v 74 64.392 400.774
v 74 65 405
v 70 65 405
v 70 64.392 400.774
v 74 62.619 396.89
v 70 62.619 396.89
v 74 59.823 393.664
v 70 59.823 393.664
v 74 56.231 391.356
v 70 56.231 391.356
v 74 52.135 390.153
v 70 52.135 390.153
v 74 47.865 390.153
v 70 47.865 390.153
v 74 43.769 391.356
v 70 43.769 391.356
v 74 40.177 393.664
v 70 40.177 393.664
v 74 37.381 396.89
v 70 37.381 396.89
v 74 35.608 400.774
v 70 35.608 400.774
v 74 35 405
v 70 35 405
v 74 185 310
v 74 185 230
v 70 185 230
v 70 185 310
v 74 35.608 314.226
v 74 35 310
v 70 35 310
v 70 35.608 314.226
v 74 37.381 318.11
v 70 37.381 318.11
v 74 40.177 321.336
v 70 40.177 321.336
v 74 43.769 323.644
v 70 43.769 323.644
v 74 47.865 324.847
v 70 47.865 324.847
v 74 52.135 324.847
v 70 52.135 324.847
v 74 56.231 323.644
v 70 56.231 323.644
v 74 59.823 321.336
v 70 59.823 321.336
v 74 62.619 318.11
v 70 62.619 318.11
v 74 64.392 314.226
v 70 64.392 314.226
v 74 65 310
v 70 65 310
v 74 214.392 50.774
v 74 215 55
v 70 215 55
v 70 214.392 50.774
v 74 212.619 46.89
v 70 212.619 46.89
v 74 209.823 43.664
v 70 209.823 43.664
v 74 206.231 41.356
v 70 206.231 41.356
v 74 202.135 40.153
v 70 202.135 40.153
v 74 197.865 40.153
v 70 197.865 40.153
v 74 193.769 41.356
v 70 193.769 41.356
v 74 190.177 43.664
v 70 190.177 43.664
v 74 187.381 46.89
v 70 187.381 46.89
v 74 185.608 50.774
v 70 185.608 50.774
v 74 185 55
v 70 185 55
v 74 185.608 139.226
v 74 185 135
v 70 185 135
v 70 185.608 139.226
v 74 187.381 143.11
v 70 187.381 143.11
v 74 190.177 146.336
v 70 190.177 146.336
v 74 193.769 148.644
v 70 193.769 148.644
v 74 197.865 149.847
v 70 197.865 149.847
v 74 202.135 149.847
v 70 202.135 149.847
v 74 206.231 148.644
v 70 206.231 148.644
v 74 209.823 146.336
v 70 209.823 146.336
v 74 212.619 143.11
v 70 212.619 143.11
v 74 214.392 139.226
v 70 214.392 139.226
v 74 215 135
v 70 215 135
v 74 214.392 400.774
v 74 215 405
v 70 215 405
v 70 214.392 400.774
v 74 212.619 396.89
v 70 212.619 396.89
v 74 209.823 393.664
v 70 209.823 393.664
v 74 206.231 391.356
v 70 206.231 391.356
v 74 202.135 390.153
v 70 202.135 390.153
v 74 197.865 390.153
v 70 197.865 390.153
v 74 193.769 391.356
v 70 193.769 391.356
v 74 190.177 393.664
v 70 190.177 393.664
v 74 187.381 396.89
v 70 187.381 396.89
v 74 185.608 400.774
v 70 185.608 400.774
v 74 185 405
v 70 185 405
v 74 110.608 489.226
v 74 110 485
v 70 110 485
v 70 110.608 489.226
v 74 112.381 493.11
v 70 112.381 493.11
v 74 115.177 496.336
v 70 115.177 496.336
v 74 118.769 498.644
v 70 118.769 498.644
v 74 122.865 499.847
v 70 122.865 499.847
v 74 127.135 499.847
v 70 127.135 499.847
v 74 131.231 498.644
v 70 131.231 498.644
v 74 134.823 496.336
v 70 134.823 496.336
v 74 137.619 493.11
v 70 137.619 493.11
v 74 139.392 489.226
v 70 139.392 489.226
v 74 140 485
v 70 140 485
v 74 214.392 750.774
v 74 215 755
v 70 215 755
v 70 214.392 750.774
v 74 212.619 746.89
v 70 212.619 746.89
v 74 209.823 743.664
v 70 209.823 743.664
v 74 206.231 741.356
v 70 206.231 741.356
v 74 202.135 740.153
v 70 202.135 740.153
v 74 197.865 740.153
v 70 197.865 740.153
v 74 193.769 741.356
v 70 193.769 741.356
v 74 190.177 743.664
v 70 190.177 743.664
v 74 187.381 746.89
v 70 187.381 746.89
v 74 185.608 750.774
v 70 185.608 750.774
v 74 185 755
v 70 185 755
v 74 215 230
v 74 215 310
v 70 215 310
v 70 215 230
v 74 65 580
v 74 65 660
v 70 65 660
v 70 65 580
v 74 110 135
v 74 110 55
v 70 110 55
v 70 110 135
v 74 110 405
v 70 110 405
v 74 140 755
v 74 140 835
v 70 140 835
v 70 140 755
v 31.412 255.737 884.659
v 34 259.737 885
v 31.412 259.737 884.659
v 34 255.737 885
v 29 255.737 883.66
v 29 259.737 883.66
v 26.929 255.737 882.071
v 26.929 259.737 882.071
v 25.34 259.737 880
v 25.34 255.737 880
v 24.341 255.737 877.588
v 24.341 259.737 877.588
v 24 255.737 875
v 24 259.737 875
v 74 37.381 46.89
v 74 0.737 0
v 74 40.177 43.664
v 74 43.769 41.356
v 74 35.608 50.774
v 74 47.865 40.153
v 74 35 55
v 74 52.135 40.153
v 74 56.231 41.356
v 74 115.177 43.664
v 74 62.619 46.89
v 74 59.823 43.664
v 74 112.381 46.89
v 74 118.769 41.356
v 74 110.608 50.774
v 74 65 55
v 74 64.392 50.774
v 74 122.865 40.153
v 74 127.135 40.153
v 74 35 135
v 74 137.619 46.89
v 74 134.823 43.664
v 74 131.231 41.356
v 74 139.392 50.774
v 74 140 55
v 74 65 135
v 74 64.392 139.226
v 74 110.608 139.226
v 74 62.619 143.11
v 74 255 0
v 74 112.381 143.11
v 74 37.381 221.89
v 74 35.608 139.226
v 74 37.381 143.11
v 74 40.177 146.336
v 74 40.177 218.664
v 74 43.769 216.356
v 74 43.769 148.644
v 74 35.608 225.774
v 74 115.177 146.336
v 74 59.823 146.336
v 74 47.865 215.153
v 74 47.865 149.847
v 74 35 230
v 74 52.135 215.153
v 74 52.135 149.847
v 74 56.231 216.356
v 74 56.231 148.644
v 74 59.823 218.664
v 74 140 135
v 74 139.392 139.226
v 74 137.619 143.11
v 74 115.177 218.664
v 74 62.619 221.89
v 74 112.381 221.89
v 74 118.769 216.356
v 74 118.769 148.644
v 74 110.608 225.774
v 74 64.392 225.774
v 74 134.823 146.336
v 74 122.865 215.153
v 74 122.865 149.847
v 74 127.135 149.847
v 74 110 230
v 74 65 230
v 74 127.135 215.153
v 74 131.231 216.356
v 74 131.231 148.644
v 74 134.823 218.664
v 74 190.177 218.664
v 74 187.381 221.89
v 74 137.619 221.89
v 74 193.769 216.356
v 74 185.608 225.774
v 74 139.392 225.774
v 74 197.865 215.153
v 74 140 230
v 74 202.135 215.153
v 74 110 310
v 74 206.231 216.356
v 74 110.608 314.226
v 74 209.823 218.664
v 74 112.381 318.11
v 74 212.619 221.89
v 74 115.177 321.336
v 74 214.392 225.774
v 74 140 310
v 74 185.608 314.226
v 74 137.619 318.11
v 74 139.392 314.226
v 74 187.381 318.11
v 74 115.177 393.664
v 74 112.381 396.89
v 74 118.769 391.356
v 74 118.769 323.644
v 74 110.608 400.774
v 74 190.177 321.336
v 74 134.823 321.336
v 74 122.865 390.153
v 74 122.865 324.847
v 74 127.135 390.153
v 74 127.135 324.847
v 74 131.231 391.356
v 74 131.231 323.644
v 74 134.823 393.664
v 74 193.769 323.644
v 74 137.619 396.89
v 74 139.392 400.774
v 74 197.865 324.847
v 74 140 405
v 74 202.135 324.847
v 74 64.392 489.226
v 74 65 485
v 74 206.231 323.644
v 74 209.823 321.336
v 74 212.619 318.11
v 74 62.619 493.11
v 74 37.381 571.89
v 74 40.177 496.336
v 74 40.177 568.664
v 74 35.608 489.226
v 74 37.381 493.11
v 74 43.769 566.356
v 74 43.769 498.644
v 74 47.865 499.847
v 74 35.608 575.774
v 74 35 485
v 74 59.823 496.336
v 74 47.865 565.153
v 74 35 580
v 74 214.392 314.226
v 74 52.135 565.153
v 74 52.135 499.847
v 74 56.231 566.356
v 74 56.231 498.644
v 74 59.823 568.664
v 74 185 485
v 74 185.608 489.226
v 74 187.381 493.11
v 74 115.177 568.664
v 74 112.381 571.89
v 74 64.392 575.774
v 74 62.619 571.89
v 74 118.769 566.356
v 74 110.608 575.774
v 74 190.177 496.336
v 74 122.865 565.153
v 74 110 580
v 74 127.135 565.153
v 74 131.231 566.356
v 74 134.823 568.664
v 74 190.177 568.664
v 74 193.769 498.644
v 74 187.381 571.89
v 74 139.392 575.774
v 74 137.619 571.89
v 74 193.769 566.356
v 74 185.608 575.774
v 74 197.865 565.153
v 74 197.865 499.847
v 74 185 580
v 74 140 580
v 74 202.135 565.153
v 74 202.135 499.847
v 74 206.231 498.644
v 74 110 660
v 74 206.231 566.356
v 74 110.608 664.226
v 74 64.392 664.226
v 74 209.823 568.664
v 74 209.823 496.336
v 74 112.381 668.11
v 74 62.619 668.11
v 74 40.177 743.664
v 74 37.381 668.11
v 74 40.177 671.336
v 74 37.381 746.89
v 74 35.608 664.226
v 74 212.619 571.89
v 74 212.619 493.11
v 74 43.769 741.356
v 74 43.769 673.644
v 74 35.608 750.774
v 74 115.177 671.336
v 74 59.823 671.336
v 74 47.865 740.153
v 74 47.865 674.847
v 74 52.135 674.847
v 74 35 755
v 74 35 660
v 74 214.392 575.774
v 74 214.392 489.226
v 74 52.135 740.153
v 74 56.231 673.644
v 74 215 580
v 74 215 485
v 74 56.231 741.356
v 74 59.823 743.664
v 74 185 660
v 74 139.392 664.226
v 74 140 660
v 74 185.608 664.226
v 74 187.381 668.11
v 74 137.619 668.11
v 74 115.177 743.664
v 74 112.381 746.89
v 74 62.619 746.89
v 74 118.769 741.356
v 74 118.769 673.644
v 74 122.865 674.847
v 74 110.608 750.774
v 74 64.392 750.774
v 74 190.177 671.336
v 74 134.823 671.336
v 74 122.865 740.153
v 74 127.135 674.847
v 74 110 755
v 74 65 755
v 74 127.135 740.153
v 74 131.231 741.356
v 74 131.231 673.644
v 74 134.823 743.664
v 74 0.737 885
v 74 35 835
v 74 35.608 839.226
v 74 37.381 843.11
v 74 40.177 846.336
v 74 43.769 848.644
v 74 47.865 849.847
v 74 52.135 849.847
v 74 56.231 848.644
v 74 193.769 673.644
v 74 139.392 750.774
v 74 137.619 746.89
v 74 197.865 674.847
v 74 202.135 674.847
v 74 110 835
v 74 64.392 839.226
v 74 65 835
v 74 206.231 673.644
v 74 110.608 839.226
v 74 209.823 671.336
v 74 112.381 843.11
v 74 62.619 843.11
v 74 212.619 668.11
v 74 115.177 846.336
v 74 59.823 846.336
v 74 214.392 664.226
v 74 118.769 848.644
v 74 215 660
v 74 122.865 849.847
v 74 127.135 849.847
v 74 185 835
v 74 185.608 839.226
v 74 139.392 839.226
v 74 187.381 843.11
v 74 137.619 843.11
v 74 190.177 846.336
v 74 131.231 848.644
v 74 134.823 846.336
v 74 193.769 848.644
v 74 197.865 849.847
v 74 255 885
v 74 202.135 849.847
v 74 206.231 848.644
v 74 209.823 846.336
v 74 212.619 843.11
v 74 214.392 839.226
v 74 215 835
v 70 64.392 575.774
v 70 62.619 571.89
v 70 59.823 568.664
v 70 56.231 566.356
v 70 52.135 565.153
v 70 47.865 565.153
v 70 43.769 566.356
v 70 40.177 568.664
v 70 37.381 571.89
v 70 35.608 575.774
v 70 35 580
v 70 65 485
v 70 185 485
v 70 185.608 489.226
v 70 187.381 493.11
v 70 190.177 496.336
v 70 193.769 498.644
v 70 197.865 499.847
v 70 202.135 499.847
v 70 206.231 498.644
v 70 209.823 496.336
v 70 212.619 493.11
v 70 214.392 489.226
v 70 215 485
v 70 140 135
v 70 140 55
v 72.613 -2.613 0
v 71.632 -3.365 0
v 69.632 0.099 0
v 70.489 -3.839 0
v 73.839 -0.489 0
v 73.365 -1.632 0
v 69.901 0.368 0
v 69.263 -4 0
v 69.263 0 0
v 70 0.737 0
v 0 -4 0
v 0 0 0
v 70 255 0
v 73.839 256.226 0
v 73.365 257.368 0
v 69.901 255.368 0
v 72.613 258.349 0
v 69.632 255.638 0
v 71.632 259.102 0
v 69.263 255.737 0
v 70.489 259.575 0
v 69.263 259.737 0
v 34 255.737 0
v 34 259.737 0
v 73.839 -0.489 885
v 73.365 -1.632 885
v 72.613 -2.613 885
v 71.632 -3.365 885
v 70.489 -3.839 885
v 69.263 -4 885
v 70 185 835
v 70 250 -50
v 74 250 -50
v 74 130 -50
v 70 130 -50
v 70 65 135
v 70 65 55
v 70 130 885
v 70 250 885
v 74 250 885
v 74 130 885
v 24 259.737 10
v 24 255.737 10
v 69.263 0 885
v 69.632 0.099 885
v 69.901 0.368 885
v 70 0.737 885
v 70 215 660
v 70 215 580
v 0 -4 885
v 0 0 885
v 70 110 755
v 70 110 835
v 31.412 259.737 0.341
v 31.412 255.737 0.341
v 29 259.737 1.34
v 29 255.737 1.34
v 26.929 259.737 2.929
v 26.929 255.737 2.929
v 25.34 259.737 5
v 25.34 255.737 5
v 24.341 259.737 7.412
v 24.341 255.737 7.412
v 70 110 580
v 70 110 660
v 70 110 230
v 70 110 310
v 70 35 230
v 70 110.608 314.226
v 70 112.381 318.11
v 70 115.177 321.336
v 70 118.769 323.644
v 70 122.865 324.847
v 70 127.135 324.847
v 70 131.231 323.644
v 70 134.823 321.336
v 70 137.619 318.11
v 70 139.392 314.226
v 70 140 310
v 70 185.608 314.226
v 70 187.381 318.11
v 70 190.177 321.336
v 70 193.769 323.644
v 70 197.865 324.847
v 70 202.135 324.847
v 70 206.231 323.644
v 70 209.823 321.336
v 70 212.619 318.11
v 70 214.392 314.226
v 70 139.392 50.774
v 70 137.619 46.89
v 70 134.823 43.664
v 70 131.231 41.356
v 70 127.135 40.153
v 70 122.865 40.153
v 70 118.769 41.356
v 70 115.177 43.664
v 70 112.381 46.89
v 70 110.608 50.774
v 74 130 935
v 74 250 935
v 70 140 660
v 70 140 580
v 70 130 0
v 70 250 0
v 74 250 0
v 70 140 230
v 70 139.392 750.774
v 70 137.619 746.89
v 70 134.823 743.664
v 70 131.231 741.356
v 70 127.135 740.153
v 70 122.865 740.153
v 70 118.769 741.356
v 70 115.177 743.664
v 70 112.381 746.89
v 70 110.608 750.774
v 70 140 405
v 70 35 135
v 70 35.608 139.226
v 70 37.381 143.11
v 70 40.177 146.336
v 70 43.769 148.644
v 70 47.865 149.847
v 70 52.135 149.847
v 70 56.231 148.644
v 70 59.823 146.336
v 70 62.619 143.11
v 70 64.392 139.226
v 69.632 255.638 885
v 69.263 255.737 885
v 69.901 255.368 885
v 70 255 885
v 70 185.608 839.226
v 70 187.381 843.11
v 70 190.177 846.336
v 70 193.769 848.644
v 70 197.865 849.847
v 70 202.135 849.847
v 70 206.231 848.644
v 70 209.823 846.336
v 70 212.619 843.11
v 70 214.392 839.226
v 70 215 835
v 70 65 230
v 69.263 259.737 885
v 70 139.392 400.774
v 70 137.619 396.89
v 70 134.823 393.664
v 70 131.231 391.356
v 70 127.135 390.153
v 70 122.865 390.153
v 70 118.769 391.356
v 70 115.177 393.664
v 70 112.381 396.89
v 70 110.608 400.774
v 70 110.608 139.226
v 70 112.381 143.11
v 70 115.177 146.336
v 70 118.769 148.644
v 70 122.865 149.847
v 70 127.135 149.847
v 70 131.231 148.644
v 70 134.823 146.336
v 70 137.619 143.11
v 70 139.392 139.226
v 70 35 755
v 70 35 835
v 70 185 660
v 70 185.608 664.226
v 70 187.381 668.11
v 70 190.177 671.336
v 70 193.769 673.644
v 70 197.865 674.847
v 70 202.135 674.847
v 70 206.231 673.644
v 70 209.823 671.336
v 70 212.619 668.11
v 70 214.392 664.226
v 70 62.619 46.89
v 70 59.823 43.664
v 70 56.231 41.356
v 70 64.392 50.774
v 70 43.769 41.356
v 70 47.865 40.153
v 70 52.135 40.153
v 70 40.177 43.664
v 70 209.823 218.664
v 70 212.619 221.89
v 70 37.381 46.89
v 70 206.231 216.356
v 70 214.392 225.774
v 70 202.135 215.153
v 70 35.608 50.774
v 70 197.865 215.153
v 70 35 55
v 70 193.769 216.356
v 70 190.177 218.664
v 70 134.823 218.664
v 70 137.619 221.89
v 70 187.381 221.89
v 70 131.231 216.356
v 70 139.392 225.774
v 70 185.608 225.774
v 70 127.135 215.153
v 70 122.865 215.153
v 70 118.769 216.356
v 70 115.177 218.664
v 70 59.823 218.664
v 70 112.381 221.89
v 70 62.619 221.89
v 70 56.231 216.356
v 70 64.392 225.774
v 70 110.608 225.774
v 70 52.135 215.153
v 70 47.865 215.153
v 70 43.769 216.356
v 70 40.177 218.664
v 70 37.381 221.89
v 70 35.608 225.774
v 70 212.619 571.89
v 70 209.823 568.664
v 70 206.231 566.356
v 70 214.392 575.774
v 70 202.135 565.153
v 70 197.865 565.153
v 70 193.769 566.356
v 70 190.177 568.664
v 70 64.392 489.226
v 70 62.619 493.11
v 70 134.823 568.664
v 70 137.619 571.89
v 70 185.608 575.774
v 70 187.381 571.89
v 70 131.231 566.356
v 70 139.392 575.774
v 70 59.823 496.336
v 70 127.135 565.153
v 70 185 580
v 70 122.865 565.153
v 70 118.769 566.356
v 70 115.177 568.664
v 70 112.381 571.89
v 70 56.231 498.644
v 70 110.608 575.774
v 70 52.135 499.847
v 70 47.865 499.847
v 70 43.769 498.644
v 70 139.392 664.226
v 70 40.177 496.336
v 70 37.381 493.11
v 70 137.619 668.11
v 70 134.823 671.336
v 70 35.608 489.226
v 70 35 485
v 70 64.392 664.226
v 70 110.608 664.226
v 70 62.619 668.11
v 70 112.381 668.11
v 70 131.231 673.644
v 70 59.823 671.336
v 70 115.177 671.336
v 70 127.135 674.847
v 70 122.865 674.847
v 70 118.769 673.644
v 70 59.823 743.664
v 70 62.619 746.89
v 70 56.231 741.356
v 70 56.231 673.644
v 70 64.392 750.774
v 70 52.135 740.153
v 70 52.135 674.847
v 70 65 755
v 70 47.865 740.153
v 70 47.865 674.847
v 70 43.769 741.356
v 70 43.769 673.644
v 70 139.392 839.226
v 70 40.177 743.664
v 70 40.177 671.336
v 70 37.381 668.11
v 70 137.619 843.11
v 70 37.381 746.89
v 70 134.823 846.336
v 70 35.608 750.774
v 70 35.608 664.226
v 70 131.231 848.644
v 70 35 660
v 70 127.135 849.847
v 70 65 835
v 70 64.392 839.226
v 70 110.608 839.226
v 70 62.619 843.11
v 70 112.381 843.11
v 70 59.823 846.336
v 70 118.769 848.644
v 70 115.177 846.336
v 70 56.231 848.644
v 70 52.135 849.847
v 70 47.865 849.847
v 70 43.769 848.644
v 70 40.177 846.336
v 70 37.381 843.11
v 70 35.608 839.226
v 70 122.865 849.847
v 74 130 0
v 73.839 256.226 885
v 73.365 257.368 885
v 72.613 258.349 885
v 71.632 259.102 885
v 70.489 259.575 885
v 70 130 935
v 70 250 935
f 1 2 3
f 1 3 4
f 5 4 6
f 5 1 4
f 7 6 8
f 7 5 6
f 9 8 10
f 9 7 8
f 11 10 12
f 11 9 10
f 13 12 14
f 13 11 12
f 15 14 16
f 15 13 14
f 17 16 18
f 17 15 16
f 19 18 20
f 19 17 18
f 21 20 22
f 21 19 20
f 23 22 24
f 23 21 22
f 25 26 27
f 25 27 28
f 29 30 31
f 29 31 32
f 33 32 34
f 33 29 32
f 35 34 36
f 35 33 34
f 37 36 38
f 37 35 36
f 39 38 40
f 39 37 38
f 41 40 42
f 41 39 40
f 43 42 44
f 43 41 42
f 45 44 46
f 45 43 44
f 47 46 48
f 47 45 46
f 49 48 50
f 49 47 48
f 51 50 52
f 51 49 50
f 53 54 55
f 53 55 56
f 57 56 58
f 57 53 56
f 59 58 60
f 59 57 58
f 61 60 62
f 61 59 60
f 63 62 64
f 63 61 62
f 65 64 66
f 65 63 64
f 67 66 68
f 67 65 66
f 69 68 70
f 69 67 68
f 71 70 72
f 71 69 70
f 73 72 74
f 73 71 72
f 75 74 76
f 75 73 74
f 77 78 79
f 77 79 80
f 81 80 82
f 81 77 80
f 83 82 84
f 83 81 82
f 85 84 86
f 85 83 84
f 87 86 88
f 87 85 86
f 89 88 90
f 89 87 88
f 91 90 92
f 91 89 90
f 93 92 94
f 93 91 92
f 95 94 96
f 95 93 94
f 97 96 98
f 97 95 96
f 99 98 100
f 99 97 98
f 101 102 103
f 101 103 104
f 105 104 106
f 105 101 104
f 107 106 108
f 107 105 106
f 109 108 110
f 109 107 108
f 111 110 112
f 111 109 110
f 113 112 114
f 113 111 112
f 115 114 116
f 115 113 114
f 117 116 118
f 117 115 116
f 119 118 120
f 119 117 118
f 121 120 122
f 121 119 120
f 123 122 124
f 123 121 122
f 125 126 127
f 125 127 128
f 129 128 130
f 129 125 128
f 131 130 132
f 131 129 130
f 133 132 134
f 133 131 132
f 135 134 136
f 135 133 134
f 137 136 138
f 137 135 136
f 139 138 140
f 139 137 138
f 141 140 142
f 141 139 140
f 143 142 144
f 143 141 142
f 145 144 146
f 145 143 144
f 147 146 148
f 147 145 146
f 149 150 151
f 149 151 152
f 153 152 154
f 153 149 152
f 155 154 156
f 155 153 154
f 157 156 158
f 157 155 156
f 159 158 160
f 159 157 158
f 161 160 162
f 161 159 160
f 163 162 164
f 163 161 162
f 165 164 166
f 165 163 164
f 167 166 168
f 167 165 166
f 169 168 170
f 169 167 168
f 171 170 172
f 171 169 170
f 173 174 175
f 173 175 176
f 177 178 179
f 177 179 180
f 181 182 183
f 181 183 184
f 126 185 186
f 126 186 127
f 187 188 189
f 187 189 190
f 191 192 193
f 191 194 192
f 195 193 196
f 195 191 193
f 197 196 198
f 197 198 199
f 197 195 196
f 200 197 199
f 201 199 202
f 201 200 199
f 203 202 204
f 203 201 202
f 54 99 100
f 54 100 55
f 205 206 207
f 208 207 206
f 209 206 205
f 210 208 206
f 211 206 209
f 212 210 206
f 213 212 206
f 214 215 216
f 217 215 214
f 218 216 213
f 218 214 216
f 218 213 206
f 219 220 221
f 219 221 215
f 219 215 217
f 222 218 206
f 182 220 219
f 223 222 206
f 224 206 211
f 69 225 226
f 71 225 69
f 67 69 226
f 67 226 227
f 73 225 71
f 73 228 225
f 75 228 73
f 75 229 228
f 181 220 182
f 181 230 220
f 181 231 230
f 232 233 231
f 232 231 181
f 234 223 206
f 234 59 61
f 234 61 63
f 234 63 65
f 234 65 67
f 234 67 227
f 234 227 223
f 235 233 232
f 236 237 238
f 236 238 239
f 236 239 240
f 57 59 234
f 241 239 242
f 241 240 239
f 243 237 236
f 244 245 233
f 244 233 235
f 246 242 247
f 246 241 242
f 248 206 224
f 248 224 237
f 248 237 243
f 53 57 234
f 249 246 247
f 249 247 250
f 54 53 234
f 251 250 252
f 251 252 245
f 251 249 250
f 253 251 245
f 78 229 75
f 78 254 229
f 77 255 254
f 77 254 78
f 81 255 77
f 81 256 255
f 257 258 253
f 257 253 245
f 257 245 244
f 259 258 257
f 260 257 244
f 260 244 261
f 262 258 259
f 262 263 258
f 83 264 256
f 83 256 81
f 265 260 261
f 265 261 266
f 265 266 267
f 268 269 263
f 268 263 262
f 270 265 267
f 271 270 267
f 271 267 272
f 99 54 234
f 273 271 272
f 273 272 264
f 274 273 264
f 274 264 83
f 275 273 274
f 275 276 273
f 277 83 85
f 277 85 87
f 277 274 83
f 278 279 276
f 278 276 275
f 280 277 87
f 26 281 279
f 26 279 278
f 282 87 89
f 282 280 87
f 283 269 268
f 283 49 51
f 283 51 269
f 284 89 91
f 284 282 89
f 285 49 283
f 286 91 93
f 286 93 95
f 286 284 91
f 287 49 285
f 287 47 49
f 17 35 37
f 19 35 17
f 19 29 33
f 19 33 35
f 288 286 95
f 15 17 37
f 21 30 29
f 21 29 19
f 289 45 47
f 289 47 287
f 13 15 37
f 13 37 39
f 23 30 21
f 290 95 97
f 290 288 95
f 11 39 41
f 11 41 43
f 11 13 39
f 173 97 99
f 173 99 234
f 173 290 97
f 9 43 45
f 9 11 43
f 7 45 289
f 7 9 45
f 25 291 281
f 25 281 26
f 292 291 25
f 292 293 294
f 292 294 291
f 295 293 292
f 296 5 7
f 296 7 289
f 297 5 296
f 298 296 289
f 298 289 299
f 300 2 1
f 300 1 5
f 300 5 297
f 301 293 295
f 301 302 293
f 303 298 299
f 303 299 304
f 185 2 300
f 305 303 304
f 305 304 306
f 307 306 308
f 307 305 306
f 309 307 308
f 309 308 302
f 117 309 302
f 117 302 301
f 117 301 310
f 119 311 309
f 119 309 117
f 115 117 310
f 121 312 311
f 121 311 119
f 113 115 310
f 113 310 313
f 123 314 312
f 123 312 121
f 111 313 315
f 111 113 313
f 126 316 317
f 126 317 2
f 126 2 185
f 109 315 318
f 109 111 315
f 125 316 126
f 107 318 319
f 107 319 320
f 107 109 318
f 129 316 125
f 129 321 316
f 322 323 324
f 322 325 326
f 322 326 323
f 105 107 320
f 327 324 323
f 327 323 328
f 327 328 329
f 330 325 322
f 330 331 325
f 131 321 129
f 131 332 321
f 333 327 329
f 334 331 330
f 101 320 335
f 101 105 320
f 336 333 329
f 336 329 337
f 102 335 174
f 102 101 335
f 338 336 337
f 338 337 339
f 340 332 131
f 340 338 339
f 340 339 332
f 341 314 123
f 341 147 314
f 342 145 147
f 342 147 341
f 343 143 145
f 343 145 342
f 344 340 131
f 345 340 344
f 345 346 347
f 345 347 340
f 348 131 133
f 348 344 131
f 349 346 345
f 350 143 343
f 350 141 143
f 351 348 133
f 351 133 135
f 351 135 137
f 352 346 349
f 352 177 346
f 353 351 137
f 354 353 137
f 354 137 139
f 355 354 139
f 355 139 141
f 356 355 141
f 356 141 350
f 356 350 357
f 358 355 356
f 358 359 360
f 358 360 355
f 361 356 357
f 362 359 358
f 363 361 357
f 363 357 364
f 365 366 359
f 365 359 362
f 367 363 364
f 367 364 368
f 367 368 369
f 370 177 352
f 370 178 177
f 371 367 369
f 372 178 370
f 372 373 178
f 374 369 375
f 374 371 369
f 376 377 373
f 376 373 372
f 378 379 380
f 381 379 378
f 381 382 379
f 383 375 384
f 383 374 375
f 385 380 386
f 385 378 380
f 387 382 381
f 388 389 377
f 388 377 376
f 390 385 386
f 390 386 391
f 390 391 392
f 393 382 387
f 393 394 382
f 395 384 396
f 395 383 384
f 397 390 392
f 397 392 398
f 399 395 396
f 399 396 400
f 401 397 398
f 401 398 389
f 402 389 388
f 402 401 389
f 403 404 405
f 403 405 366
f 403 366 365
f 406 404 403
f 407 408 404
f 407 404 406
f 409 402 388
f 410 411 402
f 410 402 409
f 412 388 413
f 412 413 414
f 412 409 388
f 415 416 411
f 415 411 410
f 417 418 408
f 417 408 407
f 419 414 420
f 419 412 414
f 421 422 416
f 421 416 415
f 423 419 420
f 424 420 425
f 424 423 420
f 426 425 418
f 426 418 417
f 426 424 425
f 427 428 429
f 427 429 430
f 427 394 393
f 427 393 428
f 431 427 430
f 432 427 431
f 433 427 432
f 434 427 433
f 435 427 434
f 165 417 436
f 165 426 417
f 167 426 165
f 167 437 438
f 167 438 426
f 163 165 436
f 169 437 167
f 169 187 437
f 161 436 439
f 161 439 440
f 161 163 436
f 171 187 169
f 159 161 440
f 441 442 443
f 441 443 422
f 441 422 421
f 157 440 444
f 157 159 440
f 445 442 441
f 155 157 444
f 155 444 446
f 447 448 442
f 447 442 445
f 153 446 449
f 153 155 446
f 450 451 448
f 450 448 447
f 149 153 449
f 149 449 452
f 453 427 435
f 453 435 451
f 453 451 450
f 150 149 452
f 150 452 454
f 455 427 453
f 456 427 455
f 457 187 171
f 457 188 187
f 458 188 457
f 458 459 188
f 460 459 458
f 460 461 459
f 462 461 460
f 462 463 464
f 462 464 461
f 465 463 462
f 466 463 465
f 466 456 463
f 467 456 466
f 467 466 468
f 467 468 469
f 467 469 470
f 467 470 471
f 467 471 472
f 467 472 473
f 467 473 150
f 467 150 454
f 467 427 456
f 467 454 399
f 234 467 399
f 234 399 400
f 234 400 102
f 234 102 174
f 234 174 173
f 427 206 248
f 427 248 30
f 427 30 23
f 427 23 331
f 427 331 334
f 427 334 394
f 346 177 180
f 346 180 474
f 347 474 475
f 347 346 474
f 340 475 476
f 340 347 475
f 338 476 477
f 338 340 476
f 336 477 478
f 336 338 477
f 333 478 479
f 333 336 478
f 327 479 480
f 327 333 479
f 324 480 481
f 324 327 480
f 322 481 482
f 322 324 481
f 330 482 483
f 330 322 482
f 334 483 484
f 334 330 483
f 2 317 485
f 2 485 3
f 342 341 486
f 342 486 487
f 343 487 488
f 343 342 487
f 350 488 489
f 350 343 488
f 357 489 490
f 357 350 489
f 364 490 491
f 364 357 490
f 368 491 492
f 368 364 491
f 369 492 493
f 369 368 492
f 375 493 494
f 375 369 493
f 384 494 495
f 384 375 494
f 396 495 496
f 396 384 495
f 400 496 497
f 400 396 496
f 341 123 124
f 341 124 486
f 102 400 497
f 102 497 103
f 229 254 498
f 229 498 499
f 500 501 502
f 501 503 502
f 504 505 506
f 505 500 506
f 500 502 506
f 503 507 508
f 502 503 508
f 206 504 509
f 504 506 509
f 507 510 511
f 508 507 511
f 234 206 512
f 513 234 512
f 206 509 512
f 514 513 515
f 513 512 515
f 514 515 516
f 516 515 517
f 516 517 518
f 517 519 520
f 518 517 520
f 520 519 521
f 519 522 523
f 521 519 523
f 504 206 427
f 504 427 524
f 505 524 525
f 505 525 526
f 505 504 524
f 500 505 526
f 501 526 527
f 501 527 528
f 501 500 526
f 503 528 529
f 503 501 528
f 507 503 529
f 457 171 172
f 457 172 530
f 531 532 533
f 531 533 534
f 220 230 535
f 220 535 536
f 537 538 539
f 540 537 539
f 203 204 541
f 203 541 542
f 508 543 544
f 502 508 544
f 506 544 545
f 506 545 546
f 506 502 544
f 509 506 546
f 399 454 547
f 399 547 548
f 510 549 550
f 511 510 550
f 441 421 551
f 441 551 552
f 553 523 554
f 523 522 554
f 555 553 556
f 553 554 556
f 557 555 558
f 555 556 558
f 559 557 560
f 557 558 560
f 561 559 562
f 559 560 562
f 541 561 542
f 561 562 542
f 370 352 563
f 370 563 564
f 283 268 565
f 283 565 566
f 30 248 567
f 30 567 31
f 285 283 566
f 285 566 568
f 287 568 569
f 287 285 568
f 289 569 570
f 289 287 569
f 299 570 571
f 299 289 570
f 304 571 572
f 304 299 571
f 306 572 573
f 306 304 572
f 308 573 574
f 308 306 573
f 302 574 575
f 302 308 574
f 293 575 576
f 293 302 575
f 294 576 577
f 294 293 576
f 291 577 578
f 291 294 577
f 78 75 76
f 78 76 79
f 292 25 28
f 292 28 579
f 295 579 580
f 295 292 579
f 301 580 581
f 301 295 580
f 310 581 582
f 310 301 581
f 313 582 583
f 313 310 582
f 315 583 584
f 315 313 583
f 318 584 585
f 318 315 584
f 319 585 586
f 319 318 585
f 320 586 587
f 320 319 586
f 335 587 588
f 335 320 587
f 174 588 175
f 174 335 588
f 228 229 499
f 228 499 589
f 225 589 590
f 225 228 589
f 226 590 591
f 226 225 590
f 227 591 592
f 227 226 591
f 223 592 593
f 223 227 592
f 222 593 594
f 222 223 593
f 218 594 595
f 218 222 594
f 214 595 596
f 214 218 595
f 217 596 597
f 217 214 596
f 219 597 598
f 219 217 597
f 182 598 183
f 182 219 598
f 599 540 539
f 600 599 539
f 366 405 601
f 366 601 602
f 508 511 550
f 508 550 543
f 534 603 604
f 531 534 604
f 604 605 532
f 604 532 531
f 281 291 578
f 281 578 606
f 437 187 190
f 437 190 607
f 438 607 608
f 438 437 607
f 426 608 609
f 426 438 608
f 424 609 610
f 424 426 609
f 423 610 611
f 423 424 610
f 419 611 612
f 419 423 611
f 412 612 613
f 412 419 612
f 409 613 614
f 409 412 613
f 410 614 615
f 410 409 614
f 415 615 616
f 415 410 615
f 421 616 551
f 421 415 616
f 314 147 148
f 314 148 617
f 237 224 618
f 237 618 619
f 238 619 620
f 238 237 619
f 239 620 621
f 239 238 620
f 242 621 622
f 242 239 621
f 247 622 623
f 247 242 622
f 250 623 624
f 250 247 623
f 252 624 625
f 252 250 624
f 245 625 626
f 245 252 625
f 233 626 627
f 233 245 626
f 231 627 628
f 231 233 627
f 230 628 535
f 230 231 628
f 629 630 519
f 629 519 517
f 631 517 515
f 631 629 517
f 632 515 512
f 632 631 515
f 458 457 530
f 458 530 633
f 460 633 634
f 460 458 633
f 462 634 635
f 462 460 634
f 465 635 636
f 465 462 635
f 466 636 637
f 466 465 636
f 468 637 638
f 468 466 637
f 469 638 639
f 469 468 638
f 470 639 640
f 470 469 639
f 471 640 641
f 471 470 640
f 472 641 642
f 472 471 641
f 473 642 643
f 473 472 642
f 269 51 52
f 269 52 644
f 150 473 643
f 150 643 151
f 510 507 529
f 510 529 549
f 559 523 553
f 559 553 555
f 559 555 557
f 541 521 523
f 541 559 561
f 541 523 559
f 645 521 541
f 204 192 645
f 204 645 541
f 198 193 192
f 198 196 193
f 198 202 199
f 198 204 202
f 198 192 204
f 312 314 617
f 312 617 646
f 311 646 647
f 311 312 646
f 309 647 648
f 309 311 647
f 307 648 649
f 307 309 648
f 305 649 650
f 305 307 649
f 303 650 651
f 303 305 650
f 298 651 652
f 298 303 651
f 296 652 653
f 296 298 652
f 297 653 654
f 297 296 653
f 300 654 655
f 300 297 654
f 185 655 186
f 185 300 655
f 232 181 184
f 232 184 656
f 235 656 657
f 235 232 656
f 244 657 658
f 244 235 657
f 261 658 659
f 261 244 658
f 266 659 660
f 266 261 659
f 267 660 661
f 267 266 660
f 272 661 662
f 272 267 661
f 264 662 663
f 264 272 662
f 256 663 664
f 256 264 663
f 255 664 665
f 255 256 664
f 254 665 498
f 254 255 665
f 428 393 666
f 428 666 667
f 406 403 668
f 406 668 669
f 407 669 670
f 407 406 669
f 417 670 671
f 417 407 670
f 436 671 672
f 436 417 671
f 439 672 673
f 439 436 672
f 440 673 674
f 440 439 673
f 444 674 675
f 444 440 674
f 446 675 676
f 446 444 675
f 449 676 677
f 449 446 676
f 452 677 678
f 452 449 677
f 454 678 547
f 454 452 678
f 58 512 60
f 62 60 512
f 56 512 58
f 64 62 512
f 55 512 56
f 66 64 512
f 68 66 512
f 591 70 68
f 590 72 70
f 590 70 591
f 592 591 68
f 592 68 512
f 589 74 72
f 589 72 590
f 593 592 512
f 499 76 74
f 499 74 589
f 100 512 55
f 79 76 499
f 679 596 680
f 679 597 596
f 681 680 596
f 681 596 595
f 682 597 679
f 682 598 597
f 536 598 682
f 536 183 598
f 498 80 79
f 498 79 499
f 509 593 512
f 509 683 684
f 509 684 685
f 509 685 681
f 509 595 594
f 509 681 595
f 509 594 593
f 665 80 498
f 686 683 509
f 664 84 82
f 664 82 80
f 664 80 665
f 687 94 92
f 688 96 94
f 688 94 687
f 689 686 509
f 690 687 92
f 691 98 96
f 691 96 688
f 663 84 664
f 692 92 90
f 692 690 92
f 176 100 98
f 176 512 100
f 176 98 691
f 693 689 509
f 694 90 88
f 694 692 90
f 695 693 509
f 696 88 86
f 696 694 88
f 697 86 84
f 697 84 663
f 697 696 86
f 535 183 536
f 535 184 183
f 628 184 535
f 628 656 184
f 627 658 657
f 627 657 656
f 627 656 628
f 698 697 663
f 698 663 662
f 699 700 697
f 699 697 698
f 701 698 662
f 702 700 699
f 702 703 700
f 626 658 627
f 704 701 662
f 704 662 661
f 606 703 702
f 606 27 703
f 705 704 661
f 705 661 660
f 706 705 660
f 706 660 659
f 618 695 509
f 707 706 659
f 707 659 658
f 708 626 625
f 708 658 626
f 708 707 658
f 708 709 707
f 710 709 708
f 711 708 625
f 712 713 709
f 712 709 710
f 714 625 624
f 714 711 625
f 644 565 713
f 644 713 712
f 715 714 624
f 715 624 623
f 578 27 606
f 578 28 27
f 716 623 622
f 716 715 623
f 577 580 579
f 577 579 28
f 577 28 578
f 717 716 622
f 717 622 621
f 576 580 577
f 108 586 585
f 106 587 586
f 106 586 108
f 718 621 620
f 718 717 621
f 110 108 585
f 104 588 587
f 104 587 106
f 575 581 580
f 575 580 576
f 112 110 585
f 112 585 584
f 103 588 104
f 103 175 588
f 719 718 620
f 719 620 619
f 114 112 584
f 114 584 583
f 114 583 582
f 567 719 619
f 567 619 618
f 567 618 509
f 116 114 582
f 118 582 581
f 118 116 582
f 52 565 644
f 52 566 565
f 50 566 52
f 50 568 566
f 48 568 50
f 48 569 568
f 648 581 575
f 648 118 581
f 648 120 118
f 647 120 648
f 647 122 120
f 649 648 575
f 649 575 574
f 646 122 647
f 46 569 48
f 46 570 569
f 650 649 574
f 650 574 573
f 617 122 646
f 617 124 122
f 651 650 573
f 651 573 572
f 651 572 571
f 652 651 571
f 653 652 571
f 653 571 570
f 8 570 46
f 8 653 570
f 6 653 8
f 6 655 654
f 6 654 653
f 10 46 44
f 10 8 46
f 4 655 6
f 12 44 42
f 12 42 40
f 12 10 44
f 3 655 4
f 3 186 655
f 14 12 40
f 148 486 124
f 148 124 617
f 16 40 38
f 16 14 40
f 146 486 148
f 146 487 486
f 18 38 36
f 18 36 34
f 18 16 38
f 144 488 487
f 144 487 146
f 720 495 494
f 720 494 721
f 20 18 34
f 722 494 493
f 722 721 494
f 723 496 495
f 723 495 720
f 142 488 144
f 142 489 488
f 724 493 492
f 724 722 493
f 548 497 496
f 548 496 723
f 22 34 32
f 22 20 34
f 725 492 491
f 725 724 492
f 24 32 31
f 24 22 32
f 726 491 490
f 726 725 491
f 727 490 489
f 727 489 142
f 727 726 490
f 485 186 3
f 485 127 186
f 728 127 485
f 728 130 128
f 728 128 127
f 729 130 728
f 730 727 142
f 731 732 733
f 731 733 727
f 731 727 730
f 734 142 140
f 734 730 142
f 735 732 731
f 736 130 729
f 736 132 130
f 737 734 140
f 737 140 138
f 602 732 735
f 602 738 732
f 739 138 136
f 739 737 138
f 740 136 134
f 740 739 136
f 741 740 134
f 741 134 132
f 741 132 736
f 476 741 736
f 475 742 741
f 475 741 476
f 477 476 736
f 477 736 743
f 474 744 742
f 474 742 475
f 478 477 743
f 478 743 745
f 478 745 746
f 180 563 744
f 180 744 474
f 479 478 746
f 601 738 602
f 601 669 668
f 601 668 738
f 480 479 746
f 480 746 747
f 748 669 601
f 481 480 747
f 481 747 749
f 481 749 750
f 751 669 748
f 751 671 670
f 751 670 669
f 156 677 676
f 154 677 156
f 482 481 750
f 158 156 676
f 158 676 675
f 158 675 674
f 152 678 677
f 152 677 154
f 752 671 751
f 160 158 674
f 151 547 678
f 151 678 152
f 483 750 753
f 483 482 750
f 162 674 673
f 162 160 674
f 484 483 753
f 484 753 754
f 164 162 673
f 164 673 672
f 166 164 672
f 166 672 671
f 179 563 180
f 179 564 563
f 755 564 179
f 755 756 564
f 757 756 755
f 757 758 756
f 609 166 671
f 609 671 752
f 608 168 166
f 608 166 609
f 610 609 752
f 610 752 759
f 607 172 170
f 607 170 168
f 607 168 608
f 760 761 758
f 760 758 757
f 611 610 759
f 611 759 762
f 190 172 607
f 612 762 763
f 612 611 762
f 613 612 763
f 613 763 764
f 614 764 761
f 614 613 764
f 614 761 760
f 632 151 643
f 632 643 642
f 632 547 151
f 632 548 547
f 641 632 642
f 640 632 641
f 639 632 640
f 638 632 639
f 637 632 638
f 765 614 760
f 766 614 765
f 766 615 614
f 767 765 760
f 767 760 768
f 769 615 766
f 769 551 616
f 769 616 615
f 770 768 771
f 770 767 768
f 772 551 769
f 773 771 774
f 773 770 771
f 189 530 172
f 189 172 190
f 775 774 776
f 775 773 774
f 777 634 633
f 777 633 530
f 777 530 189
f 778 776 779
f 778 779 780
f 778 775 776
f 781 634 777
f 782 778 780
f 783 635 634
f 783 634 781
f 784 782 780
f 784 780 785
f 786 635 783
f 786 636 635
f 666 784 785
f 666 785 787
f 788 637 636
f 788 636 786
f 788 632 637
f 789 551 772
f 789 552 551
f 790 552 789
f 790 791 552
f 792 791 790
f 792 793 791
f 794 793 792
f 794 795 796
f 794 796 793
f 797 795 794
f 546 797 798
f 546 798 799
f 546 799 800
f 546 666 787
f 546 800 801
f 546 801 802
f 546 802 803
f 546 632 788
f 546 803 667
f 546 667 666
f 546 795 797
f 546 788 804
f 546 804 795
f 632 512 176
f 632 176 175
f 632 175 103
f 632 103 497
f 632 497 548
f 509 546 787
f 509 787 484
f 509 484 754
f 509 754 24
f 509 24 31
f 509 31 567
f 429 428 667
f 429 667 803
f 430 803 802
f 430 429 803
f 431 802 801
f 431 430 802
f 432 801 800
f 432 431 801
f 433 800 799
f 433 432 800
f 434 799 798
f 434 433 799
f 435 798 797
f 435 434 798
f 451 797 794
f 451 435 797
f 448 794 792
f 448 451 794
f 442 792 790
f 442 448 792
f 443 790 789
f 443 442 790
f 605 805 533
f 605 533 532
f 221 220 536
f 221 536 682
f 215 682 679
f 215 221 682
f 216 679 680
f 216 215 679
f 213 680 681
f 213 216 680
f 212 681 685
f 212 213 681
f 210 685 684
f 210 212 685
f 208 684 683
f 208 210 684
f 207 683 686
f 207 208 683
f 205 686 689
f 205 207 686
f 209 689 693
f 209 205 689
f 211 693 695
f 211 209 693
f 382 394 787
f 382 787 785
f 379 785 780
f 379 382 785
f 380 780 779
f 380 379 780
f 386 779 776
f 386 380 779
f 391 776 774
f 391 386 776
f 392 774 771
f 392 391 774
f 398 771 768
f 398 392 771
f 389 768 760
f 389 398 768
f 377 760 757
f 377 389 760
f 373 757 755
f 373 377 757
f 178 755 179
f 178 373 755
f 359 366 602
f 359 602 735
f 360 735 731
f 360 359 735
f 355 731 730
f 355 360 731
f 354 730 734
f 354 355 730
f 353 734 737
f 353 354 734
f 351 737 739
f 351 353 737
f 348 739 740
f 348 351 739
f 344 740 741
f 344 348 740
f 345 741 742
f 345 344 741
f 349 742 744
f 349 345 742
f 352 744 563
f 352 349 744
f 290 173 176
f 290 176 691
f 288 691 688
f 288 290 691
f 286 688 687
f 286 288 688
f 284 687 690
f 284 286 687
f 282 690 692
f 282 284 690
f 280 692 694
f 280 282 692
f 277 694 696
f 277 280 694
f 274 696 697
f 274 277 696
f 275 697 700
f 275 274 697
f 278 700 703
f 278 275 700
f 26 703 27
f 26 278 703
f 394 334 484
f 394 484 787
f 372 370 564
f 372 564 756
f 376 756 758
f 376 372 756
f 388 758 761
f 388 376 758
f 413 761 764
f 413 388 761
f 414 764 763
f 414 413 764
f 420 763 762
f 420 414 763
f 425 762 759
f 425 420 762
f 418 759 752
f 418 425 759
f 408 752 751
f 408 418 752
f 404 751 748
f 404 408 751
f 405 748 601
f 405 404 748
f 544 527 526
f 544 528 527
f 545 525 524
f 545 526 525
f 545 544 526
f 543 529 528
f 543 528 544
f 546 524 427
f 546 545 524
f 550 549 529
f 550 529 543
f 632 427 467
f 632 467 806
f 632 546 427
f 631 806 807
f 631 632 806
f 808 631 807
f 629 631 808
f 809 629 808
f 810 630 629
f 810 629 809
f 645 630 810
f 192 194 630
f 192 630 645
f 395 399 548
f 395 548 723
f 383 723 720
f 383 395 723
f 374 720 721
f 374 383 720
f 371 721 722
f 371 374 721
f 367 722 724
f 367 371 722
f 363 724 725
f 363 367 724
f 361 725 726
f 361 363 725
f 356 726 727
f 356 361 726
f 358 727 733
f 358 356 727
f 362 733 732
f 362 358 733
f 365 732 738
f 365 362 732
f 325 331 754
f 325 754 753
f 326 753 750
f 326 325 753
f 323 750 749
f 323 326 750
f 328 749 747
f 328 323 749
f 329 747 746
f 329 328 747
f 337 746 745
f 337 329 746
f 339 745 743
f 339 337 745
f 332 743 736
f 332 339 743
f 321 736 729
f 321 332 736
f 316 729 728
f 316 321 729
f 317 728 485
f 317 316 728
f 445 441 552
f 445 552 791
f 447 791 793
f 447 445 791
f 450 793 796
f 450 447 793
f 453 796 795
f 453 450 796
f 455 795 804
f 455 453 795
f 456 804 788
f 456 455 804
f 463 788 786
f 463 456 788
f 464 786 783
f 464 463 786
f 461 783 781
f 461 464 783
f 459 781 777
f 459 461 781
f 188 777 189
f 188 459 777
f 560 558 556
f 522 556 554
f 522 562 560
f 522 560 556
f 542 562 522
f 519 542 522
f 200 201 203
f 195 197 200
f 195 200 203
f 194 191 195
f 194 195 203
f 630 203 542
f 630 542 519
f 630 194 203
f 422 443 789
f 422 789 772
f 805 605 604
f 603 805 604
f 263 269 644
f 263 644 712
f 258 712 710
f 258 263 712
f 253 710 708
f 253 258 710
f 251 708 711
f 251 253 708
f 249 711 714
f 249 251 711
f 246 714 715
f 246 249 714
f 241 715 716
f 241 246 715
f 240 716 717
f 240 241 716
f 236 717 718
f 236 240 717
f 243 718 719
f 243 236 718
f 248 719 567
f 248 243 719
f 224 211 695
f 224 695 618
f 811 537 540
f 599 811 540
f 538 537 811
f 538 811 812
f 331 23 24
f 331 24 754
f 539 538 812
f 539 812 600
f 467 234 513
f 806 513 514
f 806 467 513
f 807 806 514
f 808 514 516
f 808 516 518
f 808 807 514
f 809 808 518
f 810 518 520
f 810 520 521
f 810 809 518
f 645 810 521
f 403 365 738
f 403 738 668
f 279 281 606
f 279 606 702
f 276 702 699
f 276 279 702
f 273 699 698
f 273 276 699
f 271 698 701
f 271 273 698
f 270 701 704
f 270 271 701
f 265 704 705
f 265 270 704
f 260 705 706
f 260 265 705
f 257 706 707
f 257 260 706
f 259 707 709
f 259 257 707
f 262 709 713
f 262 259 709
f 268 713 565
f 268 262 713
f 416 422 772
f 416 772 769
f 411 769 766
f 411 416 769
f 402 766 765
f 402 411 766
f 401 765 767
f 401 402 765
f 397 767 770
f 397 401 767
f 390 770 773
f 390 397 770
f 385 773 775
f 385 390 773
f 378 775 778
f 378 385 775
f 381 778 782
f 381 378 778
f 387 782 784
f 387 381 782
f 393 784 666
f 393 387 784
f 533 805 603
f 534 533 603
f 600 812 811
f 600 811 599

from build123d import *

# Parameters (mm, degrees)
TABAN_FLAN_1_DEPTH    = 885
KES_EKSTR_ZYON1_DEPTH = 10
L_O_ALTMA1_COUNT      = 5
L_O_ALTMA1_PITCH      = 175
L_O_ALTMA1_COUNT_DIR2 = 3
L_O_ALTMA1_PITCH_DIR2 = 75
IZIM7_W               = 4
IZIM7_H               = 120
TABAN_FLAN_2_DEPTH    = 50
IZIM10_W              = 4
IZIM10_H              = 120
TABAN_FLAN_3_DEPTH    = 50
KENAR_FLAN_1_DEPTH    = 885
RADYUS2_R             = 10


# Sheet-metal steps are written as plain solids
with BuildPart() as part:
    # Çizim1 → Taban-Flanş1 (new body)
    with BuildSketch(Plane.XY):
        with BuildLine():
            Line((0, 0), (69.2634, 0))
            ThreePointArc((69.2634, 0), (69.784254855, 0.215745145), (70, 0.7366))
            Line((70, 0.7366), (70, 250))
            Line((70, 250), (74, 250))
            Line((74, 250), (74, 0.7366))
            ThreePointArc((74, 0.7366), (72.61268198, -2.61268198), (69.2634, -4))
            Line((69.2634, -4), (0, -4))
            Line((0, -4), (0, 0))
        make_face()
    extrude(amount=TABAN_FLAN_1_DEPTH)

    # Çizim6 → Kes-Ekstrüzyon1 (cut)
    with BuildSketch(Plane(origin=(74, 0, 0), x_dir=(0, 0, -1), z_dir=(1, 0, 0))):
        with BuildLine():
            Line((-835, 215), (-755, 215))
            ThreePointArc((-755, 215), (-740, 200), (-755, 185))
            Line((-755, 185), (-835, 185))
            ThreePointArc((-835, 185), (-850, 200), (-835, 215))
        make_face()
    kes_ekstr_zyon1 = extrude(amount=-KES_EKSTR_ZYON1_DEPTH, mode=Mode.SUBTRACT)

    # LÇoğaltma1: Kes-Ekstr_zyon1 5 × 3
    with Locations(*[(0, -j * L_O_ALTMA1_PITCH_DIR2, -i * L_O_ALTMA1_PITCH) for i in range(L_O_ALTMA1_COUNT) for j in range(L_O_ALTMA1_COUNT_DIR2) if (i, j) != (0, 0)]):
        add(kes_ekstr_zyon1, mode=Mode.SUBTRACT)

    # Kenar-Flanş1 section (across the edge) → Kenar-Flanş1 (add)
    with BuildSketch(Plane(origin=(70, 255.7366, 885), x_dir=(0, -1, 0), z_dir=(0, 0, -1))):
        with BuildLine():
            Line((-4, 0.7366), (-4, 46))
            Line((-4, 46), (0, 46))
            Line((0, 46), (0, 0.7366))
            ThreePointArc((0, 0.7366), (0.215745145, 0.215745145), (0.7366, 0))
            Line((0.7366, 0), (5.7366, 0))
            Line((5.7366, 0), (5.7366, -4))
            Line((5.7366, -4), (0.7366, -4))
            ThreePointArc((0.7366, -4), (-2.61268198, -2.61268198), (-4, 0.7366))
        make_face()
    extrude(amount=KENAR_FLAN_1_DEPTH)

    # Radyus2
    radyus2_edges = [part.edges().sort_by_distance(p)[0] for p in [
        (24, 257.7366, 885),
        (24, 257.7366, 0),
    ]]
    fillet(radyus2_edges, radius=RADYUS2_R)


with BuildPart() as body_2:
    # Çizim7 → Taban-Flanş2 (new body)
    with BuildSketch(Plane.XY.offset(885)):
        with Locations((72, 190)):
            Rectangle(IZIM7_W, IZIM7_H)
    extrude(amount=TABAN_FLAN_2_DEPTH)


with BuildPart() as body_3:
    # Çizim10 → Taban-Flanş3 (new body)
    with BuildSketch(Plane(origin=(0, 0, 0), x_dir=(-1, 0, 0), z_dir=(0, 0, -1))):
        with Locations((-72, 190)):
            Rectangle(IZIM10_W, IZIM10_H)
    extrude(amount=TABAN_FLAN_3_DEPTH)


solid = Compound([part.part, body_2.part, body_3.part])
